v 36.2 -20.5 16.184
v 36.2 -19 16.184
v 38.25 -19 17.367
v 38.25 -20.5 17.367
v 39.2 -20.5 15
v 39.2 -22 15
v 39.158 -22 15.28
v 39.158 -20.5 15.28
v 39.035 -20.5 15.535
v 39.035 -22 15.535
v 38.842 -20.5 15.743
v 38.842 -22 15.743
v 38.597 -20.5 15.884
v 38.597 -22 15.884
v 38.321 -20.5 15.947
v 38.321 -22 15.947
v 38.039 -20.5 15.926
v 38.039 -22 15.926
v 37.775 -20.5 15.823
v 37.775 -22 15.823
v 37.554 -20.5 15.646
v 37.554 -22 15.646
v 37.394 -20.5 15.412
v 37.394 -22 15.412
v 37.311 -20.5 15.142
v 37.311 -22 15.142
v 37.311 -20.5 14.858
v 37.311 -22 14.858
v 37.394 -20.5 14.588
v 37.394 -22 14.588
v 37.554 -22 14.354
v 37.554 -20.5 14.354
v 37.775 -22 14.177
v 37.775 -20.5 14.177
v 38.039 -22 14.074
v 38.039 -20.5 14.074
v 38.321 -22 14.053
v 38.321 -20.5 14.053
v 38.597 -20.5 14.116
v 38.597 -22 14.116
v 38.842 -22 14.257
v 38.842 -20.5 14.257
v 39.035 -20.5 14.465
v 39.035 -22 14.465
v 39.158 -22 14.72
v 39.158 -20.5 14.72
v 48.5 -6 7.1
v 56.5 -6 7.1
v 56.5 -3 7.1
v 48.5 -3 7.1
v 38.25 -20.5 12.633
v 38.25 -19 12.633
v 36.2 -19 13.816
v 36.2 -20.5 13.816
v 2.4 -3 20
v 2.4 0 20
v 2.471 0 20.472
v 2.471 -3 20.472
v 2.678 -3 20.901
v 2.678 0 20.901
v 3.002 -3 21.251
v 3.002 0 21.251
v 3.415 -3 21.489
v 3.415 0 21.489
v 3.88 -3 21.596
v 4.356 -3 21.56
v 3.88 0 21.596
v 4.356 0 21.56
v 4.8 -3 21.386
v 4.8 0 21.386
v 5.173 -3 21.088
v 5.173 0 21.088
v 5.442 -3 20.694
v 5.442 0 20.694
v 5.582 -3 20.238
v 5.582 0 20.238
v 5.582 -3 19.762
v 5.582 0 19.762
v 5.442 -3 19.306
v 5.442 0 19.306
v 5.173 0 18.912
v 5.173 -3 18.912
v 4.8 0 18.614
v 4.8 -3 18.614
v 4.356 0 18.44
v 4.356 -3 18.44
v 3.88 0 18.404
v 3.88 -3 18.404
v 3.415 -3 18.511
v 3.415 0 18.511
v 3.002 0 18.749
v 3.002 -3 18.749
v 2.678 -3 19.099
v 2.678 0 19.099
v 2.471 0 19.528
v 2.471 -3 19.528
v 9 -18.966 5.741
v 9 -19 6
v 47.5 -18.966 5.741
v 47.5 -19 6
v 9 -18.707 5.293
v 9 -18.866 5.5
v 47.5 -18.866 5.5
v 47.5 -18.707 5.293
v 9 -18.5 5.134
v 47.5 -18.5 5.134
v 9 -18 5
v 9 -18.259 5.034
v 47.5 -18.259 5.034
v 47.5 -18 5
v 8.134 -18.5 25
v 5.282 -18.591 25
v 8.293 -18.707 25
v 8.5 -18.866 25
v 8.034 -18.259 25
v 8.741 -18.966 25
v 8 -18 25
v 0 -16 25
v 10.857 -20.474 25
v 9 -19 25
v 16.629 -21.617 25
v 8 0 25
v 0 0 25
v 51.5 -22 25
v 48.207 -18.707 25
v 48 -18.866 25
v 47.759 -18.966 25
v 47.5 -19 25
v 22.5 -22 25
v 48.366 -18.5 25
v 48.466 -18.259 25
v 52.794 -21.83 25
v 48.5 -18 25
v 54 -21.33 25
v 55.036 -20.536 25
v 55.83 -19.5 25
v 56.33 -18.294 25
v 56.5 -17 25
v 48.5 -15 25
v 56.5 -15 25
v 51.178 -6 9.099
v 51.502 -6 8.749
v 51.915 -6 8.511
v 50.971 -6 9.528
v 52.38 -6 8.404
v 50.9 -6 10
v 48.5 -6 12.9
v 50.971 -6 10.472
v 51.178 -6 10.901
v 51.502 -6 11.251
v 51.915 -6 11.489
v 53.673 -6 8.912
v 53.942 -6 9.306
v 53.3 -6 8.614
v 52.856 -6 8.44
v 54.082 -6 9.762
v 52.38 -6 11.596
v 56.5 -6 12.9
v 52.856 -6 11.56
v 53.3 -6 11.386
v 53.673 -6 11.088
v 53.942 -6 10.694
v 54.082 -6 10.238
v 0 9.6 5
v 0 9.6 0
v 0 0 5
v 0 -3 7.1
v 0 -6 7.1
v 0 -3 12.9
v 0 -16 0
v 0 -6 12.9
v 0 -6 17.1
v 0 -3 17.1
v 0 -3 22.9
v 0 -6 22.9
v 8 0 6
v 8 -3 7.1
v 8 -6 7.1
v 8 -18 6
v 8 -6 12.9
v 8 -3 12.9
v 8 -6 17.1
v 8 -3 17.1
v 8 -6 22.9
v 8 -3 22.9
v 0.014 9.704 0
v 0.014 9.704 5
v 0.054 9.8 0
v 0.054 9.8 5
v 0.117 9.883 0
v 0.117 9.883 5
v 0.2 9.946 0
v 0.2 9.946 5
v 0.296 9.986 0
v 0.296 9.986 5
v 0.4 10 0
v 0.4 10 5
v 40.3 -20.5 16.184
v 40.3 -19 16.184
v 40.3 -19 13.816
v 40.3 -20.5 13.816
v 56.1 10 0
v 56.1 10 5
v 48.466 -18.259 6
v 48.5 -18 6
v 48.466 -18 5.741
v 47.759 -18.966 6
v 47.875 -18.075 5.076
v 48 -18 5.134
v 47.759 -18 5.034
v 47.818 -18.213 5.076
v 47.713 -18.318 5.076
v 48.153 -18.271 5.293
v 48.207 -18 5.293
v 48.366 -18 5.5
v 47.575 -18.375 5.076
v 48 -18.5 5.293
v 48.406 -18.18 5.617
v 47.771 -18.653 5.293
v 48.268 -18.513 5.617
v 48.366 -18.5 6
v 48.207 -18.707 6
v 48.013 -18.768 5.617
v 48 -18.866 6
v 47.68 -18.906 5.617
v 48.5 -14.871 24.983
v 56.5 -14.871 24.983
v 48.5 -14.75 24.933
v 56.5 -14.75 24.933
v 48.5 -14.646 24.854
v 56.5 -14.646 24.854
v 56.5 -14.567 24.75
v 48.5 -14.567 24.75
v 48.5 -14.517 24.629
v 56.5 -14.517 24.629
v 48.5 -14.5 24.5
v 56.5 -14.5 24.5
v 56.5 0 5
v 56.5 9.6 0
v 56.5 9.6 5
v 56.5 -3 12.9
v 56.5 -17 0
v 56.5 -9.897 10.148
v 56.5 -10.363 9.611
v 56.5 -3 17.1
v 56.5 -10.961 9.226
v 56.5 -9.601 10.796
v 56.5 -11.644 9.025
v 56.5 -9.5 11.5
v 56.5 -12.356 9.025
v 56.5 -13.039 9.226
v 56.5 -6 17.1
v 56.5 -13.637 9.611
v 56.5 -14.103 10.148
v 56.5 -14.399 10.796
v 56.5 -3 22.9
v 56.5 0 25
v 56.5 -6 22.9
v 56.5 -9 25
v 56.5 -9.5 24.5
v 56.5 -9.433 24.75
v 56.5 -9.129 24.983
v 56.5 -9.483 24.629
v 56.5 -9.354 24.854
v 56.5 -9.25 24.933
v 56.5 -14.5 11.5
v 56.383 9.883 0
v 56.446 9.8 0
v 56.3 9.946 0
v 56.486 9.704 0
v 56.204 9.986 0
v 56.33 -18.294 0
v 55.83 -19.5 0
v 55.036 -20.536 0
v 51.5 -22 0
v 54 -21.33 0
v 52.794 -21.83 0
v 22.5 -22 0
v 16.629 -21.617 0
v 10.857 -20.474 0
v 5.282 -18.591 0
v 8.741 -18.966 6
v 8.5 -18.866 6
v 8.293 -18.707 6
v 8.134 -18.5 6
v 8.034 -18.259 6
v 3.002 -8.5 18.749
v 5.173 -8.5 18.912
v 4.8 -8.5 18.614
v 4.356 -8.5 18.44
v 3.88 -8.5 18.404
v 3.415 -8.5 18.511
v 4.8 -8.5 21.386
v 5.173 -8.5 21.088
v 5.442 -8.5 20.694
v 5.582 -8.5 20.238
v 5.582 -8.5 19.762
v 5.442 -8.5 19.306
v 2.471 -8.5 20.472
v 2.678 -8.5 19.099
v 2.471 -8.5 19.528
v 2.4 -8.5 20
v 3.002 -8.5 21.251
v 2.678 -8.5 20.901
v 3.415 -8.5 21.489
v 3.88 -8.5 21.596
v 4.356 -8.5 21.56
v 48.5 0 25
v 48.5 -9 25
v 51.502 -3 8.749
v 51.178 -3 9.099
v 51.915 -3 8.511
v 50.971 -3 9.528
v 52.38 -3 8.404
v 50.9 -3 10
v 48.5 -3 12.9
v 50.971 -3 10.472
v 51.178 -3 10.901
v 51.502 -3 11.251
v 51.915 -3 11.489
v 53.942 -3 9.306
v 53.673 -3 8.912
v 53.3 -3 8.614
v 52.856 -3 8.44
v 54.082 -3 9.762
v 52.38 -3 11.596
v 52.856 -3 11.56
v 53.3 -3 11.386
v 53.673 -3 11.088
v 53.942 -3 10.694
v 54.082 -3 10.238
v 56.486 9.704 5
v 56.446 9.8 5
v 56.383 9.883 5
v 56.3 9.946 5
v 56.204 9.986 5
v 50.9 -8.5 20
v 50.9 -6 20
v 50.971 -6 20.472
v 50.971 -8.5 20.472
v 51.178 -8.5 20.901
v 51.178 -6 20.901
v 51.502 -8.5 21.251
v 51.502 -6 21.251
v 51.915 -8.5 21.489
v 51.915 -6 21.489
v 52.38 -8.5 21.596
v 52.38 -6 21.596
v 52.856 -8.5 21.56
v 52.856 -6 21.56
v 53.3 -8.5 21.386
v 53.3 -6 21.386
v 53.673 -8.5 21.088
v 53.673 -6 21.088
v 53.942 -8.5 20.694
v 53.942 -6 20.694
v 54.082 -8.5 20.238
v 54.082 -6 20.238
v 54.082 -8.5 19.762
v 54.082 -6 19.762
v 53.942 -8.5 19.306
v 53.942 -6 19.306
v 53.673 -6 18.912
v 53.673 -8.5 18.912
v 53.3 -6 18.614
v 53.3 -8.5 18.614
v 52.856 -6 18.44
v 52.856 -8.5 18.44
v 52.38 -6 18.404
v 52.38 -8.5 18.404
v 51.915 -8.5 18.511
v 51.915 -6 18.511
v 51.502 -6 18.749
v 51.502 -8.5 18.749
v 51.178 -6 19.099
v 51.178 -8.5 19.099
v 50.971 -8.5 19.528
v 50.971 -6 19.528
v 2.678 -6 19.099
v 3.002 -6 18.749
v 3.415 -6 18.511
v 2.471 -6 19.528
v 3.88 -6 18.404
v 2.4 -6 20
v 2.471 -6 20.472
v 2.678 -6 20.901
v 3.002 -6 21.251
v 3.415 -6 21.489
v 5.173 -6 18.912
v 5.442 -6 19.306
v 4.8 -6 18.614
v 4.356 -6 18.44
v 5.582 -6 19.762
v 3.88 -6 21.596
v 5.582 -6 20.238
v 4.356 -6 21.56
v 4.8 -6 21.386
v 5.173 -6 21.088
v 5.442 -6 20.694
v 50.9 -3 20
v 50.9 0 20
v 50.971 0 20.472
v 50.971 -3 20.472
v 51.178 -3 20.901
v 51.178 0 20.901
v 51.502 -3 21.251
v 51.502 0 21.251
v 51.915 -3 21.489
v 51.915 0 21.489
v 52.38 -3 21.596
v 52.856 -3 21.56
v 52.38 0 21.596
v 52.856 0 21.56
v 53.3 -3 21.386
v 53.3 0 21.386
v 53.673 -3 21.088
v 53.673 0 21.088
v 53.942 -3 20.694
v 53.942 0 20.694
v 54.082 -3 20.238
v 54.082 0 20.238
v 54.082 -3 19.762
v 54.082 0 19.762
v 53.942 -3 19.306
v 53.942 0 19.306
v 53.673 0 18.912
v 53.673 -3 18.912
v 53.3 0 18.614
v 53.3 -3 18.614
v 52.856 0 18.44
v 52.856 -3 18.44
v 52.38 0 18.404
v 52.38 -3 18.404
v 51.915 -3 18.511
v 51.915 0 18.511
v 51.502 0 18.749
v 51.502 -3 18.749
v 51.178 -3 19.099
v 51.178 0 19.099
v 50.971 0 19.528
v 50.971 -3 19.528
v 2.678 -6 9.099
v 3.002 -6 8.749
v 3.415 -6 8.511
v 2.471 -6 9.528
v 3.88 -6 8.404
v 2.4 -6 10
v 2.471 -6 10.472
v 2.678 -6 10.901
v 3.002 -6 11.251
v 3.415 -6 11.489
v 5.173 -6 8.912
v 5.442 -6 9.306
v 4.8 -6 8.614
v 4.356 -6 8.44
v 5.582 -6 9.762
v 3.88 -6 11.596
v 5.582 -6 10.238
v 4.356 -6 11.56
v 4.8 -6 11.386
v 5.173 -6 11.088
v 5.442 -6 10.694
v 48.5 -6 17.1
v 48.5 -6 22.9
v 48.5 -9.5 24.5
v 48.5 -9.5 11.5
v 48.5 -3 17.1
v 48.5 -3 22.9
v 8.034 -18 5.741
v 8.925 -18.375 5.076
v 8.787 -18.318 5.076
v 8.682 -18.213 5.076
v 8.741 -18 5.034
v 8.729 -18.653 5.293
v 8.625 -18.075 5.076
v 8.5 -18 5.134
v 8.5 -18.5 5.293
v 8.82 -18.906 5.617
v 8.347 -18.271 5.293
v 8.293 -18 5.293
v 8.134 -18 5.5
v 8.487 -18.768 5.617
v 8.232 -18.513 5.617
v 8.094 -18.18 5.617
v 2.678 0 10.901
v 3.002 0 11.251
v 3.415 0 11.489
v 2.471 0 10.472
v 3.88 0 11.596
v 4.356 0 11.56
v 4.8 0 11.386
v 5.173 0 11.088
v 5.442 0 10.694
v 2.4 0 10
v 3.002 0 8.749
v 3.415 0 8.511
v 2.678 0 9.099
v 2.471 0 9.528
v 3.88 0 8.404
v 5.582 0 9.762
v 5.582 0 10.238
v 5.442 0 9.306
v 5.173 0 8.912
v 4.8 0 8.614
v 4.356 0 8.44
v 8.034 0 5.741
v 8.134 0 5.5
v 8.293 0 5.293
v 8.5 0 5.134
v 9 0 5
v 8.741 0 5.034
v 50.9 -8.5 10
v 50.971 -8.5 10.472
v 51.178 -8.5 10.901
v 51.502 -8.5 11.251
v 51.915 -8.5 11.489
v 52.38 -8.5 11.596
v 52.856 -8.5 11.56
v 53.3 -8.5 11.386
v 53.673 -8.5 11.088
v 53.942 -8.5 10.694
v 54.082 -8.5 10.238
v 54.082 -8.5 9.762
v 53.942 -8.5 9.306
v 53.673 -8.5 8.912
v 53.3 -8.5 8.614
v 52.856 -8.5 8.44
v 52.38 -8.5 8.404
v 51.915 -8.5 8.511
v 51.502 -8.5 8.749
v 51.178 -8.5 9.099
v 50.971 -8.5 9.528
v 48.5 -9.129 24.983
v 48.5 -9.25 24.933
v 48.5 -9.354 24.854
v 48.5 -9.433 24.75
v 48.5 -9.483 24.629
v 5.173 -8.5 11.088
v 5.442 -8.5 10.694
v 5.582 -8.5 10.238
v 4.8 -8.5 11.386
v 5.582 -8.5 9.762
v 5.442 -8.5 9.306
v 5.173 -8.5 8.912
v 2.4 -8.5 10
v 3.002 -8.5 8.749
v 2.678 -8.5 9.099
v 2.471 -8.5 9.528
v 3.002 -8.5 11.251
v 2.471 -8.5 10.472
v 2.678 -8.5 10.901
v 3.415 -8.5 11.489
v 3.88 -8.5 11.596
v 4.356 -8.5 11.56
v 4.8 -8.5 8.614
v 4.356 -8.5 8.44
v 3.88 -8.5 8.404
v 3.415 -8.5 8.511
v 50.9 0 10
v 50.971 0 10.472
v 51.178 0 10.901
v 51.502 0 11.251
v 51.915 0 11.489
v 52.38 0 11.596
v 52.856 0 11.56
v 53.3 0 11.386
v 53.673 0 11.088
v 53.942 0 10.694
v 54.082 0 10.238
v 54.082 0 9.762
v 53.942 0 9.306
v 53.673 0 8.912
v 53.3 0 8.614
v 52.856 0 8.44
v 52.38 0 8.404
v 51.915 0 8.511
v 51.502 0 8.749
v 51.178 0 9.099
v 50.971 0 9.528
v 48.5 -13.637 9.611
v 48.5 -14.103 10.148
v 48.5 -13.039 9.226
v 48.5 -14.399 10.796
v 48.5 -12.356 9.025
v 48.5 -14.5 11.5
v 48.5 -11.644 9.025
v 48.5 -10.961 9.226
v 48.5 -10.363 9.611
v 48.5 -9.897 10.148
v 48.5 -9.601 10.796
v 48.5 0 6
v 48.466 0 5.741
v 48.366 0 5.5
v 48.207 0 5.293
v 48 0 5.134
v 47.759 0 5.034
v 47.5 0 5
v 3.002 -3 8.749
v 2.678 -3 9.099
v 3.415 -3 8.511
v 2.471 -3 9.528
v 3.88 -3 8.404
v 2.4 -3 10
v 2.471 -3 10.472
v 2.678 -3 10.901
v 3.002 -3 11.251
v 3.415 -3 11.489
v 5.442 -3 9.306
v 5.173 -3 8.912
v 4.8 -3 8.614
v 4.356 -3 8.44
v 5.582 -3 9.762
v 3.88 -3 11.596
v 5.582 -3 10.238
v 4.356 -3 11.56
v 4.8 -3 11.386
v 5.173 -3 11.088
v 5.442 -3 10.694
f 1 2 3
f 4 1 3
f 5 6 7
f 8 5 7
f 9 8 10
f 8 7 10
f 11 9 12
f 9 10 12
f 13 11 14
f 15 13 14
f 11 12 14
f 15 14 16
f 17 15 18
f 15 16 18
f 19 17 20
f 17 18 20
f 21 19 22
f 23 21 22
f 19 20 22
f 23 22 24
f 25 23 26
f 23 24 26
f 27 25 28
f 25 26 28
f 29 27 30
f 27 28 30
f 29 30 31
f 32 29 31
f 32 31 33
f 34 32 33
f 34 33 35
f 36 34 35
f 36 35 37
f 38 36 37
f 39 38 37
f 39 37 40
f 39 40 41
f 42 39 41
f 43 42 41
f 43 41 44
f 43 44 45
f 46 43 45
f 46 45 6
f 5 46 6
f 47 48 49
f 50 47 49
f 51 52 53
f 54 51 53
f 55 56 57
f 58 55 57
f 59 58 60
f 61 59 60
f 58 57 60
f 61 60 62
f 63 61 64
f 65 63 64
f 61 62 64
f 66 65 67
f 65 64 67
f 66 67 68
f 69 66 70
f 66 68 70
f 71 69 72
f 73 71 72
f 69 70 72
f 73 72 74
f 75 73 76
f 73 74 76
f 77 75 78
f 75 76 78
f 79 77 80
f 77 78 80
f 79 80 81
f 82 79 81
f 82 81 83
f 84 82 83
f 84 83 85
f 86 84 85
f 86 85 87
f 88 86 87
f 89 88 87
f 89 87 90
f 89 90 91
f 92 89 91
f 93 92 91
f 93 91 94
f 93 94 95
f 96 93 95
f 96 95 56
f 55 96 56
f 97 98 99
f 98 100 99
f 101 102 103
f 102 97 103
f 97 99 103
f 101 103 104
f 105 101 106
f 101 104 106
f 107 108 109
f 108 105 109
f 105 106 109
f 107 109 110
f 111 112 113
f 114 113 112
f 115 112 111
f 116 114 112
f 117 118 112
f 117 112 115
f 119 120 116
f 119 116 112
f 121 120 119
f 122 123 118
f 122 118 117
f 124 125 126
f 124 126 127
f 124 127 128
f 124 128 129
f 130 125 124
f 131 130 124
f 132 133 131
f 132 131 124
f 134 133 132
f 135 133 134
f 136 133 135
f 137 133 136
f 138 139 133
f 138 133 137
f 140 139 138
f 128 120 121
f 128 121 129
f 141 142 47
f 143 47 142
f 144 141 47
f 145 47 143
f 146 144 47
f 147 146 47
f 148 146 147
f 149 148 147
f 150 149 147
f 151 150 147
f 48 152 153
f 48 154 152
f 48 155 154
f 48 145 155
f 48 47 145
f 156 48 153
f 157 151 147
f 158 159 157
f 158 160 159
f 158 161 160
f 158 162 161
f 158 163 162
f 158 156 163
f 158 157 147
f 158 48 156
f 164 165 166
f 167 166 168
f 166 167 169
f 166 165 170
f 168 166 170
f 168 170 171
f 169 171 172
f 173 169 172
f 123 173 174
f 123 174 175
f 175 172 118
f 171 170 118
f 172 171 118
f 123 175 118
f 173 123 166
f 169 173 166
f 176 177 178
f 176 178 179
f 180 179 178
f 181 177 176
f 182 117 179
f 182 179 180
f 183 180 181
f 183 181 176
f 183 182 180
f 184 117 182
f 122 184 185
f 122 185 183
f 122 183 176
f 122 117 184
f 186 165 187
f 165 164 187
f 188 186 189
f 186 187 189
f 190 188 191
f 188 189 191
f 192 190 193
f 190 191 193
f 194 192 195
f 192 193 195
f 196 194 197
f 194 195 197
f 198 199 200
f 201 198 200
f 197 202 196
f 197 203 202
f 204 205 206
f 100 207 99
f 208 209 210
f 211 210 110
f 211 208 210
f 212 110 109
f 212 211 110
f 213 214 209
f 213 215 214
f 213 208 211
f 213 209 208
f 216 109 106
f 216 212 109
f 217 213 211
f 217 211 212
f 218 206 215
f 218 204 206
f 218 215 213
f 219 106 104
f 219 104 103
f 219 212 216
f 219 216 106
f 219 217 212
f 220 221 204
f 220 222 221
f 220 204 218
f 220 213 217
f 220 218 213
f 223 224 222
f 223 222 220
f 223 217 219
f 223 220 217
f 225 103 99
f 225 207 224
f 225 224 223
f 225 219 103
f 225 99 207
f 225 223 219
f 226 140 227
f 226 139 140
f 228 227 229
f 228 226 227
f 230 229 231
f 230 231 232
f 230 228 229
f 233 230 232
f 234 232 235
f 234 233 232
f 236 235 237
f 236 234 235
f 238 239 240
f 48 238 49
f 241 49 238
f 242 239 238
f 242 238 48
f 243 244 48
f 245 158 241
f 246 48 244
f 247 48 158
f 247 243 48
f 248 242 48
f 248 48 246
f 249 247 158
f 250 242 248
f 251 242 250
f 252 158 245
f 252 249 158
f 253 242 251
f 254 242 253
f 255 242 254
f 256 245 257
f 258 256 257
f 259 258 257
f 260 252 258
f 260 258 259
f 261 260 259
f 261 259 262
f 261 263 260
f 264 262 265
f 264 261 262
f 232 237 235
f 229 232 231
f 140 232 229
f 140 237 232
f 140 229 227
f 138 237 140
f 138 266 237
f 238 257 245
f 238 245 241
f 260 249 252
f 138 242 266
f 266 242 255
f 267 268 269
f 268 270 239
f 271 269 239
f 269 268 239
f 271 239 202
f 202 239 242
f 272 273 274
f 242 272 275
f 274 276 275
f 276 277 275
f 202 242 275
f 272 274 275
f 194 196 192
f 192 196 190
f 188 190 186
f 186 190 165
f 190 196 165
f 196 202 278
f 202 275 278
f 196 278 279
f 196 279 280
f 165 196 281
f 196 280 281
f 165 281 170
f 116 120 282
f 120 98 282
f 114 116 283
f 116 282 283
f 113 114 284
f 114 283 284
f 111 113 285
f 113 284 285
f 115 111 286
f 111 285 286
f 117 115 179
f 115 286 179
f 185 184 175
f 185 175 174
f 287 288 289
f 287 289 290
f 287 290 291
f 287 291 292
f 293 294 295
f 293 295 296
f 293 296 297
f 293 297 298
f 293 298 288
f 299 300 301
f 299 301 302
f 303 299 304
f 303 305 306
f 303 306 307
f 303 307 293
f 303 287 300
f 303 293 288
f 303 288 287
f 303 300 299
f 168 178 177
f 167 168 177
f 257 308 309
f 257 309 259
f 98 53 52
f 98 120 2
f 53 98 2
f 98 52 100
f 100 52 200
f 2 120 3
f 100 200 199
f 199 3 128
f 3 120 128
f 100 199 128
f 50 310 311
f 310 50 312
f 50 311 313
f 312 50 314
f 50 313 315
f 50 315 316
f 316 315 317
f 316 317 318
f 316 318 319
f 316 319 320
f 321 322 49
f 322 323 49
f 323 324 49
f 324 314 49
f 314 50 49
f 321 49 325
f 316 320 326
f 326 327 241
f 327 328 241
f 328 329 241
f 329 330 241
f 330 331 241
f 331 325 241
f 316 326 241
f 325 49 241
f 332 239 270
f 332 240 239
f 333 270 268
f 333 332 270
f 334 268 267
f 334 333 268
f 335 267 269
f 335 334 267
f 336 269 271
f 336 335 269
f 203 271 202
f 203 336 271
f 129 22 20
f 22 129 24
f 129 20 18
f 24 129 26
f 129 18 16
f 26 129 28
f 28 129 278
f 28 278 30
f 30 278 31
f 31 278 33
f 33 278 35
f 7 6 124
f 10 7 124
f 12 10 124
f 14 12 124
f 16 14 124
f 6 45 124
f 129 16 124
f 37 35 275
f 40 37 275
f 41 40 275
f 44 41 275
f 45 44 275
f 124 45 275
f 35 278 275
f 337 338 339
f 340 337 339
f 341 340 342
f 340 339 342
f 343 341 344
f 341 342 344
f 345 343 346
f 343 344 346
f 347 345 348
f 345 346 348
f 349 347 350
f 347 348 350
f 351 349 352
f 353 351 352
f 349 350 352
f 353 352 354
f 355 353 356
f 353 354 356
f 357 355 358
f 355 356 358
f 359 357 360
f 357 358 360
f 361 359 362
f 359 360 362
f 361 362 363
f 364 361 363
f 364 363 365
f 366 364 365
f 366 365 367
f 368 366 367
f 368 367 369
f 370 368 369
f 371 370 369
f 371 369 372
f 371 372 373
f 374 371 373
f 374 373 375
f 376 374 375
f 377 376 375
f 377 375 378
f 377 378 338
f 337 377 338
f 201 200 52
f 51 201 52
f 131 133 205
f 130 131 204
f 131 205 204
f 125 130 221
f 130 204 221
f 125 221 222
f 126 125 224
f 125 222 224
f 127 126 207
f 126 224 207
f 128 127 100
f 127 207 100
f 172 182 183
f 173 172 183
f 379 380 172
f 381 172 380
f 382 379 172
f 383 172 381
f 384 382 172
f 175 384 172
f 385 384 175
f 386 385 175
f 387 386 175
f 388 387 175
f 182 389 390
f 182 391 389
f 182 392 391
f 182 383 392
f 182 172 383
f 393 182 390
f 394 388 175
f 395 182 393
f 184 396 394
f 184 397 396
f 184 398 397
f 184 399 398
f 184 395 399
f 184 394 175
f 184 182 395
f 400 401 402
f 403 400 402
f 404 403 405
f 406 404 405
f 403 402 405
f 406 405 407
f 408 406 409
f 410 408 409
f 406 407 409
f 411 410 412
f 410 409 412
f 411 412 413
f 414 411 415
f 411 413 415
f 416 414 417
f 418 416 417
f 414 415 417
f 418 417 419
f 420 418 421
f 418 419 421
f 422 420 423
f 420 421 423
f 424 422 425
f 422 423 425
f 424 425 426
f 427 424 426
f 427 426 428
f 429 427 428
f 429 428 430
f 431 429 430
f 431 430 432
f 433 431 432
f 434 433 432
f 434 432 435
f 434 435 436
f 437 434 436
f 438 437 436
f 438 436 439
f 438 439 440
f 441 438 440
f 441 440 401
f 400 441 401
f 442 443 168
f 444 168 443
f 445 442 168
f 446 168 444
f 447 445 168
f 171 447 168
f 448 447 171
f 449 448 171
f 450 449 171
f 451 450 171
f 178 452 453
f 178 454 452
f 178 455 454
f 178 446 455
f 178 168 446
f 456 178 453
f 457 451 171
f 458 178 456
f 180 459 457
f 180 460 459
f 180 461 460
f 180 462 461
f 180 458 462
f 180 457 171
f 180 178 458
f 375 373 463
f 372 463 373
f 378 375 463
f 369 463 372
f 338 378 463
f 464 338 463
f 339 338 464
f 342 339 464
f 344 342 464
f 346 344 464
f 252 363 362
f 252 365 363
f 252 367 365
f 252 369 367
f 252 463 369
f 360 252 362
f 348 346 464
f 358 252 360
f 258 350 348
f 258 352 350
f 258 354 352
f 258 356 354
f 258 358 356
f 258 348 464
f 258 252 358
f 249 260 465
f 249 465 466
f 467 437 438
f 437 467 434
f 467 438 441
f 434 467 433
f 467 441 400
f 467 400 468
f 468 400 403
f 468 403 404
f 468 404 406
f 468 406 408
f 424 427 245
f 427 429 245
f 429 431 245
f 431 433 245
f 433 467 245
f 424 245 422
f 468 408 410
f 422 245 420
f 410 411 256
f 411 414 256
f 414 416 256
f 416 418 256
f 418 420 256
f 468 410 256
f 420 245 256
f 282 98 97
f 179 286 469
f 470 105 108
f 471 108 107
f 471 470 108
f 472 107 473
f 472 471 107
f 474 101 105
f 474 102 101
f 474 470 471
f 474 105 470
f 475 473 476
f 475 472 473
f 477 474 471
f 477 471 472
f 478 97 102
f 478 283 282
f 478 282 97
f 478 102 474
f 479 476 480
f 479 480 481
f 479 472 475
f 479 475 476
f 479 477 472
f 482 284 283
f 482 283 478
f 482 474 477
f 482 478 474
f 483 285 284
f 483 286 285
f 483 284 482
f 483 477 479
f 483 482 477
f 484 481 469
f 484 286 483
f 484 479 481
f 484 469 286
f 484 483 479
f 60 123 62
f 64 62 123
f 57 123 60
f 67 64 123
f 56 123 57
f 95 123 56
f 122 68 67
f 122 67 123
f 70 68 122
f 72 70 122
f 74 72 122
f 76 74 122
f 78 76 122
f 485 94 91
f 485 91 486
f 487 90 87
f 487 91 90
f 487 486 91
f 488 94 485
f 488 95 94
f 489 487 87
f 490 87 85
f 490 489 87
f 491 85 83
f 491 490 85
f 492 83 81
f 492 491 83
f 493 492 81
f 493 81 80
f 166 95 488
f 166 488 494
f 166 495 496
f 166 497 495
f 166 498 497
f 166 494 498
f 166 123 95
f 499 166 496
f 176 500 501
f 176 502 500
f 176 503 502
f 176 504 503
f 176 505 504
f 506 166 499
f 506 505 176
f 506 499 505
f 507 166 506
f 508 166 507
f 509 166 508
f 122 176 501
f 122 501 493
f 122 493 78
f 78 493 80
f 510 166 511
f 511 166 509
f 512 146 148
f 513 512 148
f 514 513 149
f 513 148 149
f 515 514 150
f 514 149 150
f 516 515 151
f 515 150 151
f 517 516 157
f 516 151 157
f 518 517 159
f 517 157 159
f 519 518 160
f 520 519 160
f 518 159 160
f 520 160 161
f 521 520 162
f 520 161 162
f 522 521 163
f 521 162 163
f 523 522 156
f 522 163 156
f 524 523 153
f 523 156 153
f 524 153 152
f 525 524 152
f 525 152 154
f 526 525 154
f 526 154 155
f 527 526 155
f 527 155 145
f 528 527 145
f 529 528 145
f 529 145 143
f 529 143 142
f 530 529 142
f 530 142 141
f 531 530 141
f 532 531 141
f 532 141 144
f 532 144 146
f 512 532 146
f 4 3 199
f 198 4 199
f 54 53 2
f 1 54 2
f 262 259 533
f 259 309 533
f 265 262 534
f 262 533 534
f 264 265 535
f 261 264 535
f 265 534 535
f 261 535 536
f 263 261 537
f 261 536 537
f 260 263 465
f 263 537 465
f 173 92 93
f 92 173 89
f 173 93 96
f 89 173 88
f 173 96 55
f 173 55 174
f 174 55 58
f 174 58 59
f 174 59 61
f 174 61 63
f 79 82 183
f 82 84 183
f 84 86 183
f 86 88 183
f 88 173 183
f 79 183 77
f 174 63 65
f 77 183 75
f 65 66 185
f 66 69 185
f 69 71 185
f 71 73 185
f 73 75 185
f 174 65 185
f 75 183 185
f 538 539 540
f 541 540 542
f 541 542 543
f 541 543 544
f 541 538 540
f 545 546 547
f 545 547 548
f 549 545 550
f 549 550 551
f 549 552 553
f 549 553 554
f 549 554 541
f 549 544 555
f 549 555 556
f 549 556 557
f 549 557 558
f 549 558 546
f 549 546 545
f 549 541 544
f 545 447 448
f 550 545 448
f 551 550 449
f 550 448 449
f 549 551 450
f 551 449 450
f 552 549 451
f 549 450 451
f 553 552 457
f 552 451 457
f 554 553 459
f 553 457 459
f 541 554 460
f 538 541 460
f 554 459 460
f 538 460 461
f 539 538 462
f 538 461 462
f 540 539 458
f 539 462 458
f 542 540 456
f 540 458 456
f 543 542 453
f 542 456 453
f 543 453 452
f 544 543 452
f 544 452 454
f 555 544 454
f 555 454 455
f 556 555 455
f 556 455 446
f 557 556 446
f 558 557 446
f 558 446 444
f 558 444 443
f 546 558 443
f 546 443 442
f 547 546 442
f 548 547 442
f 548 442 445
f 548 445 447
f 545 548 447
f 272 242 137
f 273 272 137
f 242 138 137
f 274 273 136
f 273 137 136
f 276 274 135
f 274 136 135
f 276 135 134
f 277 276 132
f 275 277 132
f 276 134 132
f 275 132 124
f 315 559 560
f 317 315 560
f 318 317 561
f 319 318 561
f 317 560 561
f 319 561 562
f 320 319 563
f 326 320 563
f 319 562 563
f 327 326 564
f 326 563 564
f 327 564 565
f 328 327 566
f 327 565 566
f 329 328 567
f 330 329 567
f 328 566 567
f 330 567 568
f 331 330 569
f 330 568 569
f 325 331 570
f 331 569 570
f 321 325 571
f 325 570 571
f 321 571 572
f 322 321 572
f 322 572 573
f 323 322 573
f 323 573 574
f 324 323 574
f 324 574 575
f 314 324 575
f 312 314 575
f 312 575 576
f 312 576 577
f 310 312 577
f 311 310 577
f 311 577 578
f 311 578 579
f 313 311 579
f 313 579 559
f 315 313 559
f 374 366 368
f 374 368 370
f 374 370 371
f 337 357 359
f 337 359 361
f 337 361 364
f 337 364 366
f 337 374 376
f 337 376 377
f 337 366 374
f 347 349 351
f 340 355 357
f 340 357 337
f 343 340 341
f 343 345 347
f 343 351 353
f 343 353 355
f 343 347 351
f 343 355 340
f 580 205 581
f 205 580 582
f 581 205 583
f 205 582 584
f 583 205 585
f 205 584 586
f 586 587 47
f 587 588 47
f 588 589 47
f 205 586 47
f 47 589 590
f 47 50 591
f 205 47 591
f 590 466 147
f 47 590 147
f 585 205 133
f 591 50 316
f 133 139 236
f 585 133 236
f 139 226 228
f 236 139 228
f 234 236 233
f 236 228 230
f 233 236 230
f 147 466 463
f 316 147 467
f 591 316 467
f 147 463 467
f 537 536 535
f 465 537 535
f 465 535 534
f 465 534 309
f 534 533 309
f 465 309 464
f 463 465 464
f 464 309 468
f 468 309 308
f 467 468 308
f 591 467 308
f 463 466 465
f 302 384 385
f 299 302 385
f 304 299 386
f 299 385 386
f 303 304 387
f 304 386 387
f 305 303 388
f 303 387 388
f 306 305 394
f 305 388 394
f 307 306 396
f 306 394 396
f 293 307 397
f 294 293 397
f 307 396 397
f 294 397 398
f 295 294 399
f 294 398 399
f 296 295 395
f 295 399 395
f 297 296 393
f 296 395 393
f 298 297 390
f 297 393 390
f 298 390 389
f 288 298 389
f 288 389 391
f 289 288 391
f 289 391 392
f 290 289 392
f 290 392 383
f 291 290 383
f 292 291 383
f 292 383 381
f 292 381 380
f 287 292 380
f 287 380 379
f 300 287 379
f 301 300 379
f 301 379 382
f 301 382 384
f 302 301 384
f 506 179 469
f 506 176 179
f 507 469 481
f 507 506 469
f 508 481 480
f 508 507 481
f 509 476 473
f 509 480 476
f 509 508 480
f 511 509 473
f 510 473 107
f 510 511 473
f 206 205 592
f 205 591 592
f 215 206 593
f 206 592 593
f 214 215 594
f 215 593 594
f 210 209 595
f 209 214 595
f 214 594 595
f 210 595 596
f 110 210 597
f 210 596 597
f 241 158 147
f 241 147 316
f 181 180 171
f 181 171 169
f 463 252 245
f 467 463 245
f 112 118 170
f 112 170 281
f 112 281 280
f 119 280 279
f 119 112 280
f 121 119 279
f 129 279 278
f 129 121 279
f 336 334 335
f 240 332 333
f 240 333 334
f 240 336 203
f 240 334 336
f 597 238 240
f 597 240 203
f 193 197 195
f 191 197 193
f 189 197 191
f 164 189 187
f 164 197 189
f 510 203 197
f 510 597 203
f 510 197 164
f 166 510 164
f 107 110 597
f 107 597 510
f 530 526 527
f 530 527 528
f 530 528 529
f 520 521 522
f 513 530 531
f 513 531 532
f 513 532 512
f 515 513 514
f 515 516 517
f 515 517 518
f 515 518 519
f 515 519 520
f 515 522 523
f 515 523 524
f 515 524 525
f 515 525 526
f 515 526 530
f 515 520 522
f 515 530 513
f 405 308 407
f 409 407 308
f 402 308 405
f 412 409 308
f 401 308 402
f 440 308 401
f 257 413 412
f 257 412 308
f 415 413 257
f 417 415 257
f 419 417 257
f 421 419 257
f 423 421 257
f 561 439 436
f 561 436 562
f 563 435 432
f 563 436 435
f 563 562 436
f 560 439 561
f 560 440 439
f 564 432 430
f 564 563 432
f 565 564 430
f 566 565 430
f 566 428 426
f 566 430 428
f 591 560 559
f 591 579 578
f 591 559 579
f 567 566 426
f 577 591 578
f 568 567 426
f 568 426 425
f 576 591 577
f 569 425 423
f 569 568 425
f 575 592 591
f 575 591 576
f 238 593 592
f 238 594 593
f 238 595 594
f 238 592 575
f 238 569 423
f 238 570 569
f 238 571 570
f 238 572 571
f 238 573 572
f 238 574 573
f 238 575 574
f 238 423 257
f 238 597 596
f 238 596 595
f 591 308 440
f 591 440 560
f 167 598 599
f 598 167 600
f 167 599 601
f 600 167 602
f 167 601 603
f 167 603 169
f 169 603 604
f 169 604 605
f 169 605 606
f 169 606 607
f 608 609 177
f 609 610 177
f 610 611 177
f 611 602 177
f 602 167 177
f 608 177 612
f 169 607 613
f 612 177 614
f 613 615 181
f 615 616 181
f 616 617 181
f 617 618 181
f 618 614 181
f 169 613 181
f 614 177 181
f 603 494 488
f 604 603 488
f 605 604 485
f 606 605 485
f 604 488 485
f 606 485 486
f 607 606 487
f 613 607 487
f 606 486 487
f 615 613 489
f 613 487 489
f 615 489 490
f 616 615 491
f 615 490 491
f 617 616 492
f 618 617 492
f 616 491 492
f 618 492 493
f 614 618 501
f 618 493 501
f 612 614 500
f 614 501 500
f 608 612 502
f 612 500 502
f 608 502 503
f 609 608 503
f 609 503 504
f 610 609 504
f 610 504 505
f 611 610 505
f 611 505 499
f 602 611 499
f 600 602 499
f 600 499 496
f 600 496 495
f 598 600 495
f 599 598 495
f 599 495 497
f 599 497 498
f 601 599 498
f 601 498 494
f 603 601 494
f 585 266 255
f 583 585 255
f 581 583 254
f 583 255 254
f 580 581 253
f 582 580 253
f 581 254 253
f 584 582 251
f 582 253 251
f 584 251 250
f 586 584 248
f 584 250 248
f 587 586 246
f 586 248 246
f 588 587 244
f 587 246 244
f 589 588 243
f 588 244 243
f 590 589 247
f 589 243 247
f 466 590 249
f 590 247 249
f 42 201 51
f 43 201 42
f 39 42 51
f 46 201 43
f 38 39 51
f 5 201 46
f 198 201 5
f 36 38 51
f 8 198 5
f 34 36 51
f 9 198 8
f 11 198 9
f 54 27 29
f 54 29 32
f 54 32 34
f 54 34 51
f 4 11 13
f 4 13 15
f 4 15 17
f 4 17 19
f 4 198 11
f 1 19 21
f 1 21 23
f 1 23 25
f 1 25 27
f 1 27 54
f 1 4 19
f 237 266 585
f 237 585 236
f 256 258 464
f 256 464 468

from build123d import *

# Parameters (mm, degrees)
SKETCH125_W     = 56.5
SKETCH125_H     = 22
PAD023_DEPTH    = 25
SKETCH126_W     = 40.5
SKETCH126_H     = 19
POCKET095_DEPTH = 20
POCKET096_DEPTH = 25
SKETCH128_W     = 3
SKETCH128_H     = 5.8
POCKET098_DEPTH = 56.5
SKETCH130_R     = 1.6
POCKET099_DEPTH = 8.5
POCKET100_DEPTH = 8
FILLET035_R     = 0.5
SKETCH132_R     = 0.95
POCKET101_DEPTH = 3
POCKET102_DEPTH = 1.5
FILLET036_R     = 5
FILLET037_R     = 1
SKETCH_W        = 56.5
SKETCH_H        = 5
PAD_DEPTH       = 10
FILLET_R        = 0.4


with BuildPart() as part:
    # Sketch125 → Pad023 (new body)
    with BuildSketch(Plane.XY):
        with Locations((28.25, -11)):
            Rectangle(SKETCH125_W, SKETCH125_H)
    extrude(amount=PAD023_DEPTH)

    # Sketch126 (on Face6 of Pad023) → Pocket095 (cut)
    with BuildSketch(Plane.XY.offset(25)):
        with Locations((28.25, -9.5)):
            Rectangle(SKETCH126_W, SKETCH126_H)
    extrude(amount=-POCKET095_DEPTH, mode=Mode.SUBTRACT)

    # Sketch127 (on Face4 of Pocket095) → Pocket096 (cut)
    with BuildSketch(Plane.XY.offset(25)):
        with BuildLine():
            ThreePointArc((0, -16), (10.856869, -20.474241), (22.5, -22))
            Line((22.5, -22), (56.5, -22))
            Line((56.5, -22), (56.5, -23))
            Line((56.5, -23), (0, -23))
            Line((0, -23), (0, -16))
        make_face()
    extrude(amount=-POCKET096_DEPTH, mode=Mode.SUBTRACT)

    # Sketch128 (on Face3 of Pocket096) → Pocket098 (cut)
    with BuildSketch(Plane.YZ.offset(56.5)):
        with Locations((-4.5, 20)):
            Rectangle(SKETCH128_W, SKETCH128_H)
        with Locations((-4.5, 10)):
            Rectangle(SKETCH128_W, SKETCH128_H)
    extrude(amount=-POCKET098_DEPTH, mode=Mode.SUBTRACT)

    # Sketch130 (on Face1 of Pocket098) → Pocket099 (cut)
    with BuildSketch(Plane(origin=(0, 0, 0), x_dir=(-1, 0, 0), z_dir=(0, 1, 0))):
        with Locations((-52.5, 20)):
            Circle(SKETCH130_R)
        with Locations((-52.5, 10)):
            Circle(SKETCH130_R)
        with Locations((-4, 20)):
            Circle(SKETCH130_R)
        with Locations((-4, 10)):
            Circle(SKETCH130_R)
    extrude(amount=-POCKET099_DEPTH, mode=Mode.SUBTRACT)

    # Sketch131 (on Face4 of Pocket099) → Pocket100 (cut)
    with BuildSketch(Plane.YZ.offset(56.5)):
        with BuildLine():
            ThreePointArc((-14.5, 11.5), (-12, 9), (-9.5, 11.5))
            Line((-9.5, 25), (-9.5, 11.5))
            Line((-14.5, 25), (-9.5, 25))
            Line((-14.5, 11.5), (-14.5, 25))
        make_face()
    extrude(amount=-POCKET100_DEPTH, mode=Mode.SUBTRACT)

    # Fillet035
    fillet035_edges = [part.edges().sort_by_distance(p)[0] for p in [
        (52.5, -9.5, 25),
        (52.5, -14.5, 25),
    ]]
    fillet(fillet035_edges, radius=FILLET035_R)

    # Sketch132 (on Face4 of Fillet035) → Pocket101 (cut)
    with BuildSketch(Plane.XZ.offset(22)):
        with Locations((38.25, 15)):
            Circle(SKETCH132_R)
    extrude(amount=-POCKET101_DEPTH, mode=Mode.SUBTRACT)

    # Sketch133 (on Face22 of Pocket101) → Pocket102 (cut)
    with BuildSketch(Plane(origin=(0, -19, 0), x_dir=(-1, 0, 0), z_dir=(0, 1, 0))):
        Polygon((-36.2, 16.183568), (-38.25, 17.367136), (-40.3, 16.183568), (-40.3, 13.816432), (-38.25, 12.632864), (-36.2, 13.816432), align=None)
    extrude(amount=-POCKET102_DEPTH, mode=Mode.SUBTRACT)

    # Fillet036
    fillet036_edges = [part.edges().sort_by_distance(p)[0] for p in [
        (56.5, -22, 12.5),
    ]]
    fillet(fillet036_edges, radius=FILLET036_R)

    # Fillet037
    fillet037_edges = [part.edges().sort_by_distance(p)[0] for p in [
        (8, -19, 15),
        (48.5, -19, 15),
        (48.5, -9.5, 5),
        (28.25, -19, 5),
        (8, -9.5, 5),
    ]]
    fillet(fillet037_edges, radius=FILLET037_R)

    # Sketch (on Face11 of Fillet037) → Pad (join)
    with BuildSketch(Plane(origin=(0, 0, 0), x_dir=(-1, 0, 0), z_dir=(0, 1, 0))):
        with Locations((-28.25, 2.5)):
            Rectangle(SKETCH_W, SKETCH_H)
    extrude(amount=PAD_DEPTH)

    # Fillet
    fillet_edges = [part.edges().sort_by_distance(p)[0] for p in [
        (56.5, 10, 2.5),
        (0, 10, 2.5),
    ]]
    fillet(fillet_edges, radius=FILLET_R)


solid = part.part
